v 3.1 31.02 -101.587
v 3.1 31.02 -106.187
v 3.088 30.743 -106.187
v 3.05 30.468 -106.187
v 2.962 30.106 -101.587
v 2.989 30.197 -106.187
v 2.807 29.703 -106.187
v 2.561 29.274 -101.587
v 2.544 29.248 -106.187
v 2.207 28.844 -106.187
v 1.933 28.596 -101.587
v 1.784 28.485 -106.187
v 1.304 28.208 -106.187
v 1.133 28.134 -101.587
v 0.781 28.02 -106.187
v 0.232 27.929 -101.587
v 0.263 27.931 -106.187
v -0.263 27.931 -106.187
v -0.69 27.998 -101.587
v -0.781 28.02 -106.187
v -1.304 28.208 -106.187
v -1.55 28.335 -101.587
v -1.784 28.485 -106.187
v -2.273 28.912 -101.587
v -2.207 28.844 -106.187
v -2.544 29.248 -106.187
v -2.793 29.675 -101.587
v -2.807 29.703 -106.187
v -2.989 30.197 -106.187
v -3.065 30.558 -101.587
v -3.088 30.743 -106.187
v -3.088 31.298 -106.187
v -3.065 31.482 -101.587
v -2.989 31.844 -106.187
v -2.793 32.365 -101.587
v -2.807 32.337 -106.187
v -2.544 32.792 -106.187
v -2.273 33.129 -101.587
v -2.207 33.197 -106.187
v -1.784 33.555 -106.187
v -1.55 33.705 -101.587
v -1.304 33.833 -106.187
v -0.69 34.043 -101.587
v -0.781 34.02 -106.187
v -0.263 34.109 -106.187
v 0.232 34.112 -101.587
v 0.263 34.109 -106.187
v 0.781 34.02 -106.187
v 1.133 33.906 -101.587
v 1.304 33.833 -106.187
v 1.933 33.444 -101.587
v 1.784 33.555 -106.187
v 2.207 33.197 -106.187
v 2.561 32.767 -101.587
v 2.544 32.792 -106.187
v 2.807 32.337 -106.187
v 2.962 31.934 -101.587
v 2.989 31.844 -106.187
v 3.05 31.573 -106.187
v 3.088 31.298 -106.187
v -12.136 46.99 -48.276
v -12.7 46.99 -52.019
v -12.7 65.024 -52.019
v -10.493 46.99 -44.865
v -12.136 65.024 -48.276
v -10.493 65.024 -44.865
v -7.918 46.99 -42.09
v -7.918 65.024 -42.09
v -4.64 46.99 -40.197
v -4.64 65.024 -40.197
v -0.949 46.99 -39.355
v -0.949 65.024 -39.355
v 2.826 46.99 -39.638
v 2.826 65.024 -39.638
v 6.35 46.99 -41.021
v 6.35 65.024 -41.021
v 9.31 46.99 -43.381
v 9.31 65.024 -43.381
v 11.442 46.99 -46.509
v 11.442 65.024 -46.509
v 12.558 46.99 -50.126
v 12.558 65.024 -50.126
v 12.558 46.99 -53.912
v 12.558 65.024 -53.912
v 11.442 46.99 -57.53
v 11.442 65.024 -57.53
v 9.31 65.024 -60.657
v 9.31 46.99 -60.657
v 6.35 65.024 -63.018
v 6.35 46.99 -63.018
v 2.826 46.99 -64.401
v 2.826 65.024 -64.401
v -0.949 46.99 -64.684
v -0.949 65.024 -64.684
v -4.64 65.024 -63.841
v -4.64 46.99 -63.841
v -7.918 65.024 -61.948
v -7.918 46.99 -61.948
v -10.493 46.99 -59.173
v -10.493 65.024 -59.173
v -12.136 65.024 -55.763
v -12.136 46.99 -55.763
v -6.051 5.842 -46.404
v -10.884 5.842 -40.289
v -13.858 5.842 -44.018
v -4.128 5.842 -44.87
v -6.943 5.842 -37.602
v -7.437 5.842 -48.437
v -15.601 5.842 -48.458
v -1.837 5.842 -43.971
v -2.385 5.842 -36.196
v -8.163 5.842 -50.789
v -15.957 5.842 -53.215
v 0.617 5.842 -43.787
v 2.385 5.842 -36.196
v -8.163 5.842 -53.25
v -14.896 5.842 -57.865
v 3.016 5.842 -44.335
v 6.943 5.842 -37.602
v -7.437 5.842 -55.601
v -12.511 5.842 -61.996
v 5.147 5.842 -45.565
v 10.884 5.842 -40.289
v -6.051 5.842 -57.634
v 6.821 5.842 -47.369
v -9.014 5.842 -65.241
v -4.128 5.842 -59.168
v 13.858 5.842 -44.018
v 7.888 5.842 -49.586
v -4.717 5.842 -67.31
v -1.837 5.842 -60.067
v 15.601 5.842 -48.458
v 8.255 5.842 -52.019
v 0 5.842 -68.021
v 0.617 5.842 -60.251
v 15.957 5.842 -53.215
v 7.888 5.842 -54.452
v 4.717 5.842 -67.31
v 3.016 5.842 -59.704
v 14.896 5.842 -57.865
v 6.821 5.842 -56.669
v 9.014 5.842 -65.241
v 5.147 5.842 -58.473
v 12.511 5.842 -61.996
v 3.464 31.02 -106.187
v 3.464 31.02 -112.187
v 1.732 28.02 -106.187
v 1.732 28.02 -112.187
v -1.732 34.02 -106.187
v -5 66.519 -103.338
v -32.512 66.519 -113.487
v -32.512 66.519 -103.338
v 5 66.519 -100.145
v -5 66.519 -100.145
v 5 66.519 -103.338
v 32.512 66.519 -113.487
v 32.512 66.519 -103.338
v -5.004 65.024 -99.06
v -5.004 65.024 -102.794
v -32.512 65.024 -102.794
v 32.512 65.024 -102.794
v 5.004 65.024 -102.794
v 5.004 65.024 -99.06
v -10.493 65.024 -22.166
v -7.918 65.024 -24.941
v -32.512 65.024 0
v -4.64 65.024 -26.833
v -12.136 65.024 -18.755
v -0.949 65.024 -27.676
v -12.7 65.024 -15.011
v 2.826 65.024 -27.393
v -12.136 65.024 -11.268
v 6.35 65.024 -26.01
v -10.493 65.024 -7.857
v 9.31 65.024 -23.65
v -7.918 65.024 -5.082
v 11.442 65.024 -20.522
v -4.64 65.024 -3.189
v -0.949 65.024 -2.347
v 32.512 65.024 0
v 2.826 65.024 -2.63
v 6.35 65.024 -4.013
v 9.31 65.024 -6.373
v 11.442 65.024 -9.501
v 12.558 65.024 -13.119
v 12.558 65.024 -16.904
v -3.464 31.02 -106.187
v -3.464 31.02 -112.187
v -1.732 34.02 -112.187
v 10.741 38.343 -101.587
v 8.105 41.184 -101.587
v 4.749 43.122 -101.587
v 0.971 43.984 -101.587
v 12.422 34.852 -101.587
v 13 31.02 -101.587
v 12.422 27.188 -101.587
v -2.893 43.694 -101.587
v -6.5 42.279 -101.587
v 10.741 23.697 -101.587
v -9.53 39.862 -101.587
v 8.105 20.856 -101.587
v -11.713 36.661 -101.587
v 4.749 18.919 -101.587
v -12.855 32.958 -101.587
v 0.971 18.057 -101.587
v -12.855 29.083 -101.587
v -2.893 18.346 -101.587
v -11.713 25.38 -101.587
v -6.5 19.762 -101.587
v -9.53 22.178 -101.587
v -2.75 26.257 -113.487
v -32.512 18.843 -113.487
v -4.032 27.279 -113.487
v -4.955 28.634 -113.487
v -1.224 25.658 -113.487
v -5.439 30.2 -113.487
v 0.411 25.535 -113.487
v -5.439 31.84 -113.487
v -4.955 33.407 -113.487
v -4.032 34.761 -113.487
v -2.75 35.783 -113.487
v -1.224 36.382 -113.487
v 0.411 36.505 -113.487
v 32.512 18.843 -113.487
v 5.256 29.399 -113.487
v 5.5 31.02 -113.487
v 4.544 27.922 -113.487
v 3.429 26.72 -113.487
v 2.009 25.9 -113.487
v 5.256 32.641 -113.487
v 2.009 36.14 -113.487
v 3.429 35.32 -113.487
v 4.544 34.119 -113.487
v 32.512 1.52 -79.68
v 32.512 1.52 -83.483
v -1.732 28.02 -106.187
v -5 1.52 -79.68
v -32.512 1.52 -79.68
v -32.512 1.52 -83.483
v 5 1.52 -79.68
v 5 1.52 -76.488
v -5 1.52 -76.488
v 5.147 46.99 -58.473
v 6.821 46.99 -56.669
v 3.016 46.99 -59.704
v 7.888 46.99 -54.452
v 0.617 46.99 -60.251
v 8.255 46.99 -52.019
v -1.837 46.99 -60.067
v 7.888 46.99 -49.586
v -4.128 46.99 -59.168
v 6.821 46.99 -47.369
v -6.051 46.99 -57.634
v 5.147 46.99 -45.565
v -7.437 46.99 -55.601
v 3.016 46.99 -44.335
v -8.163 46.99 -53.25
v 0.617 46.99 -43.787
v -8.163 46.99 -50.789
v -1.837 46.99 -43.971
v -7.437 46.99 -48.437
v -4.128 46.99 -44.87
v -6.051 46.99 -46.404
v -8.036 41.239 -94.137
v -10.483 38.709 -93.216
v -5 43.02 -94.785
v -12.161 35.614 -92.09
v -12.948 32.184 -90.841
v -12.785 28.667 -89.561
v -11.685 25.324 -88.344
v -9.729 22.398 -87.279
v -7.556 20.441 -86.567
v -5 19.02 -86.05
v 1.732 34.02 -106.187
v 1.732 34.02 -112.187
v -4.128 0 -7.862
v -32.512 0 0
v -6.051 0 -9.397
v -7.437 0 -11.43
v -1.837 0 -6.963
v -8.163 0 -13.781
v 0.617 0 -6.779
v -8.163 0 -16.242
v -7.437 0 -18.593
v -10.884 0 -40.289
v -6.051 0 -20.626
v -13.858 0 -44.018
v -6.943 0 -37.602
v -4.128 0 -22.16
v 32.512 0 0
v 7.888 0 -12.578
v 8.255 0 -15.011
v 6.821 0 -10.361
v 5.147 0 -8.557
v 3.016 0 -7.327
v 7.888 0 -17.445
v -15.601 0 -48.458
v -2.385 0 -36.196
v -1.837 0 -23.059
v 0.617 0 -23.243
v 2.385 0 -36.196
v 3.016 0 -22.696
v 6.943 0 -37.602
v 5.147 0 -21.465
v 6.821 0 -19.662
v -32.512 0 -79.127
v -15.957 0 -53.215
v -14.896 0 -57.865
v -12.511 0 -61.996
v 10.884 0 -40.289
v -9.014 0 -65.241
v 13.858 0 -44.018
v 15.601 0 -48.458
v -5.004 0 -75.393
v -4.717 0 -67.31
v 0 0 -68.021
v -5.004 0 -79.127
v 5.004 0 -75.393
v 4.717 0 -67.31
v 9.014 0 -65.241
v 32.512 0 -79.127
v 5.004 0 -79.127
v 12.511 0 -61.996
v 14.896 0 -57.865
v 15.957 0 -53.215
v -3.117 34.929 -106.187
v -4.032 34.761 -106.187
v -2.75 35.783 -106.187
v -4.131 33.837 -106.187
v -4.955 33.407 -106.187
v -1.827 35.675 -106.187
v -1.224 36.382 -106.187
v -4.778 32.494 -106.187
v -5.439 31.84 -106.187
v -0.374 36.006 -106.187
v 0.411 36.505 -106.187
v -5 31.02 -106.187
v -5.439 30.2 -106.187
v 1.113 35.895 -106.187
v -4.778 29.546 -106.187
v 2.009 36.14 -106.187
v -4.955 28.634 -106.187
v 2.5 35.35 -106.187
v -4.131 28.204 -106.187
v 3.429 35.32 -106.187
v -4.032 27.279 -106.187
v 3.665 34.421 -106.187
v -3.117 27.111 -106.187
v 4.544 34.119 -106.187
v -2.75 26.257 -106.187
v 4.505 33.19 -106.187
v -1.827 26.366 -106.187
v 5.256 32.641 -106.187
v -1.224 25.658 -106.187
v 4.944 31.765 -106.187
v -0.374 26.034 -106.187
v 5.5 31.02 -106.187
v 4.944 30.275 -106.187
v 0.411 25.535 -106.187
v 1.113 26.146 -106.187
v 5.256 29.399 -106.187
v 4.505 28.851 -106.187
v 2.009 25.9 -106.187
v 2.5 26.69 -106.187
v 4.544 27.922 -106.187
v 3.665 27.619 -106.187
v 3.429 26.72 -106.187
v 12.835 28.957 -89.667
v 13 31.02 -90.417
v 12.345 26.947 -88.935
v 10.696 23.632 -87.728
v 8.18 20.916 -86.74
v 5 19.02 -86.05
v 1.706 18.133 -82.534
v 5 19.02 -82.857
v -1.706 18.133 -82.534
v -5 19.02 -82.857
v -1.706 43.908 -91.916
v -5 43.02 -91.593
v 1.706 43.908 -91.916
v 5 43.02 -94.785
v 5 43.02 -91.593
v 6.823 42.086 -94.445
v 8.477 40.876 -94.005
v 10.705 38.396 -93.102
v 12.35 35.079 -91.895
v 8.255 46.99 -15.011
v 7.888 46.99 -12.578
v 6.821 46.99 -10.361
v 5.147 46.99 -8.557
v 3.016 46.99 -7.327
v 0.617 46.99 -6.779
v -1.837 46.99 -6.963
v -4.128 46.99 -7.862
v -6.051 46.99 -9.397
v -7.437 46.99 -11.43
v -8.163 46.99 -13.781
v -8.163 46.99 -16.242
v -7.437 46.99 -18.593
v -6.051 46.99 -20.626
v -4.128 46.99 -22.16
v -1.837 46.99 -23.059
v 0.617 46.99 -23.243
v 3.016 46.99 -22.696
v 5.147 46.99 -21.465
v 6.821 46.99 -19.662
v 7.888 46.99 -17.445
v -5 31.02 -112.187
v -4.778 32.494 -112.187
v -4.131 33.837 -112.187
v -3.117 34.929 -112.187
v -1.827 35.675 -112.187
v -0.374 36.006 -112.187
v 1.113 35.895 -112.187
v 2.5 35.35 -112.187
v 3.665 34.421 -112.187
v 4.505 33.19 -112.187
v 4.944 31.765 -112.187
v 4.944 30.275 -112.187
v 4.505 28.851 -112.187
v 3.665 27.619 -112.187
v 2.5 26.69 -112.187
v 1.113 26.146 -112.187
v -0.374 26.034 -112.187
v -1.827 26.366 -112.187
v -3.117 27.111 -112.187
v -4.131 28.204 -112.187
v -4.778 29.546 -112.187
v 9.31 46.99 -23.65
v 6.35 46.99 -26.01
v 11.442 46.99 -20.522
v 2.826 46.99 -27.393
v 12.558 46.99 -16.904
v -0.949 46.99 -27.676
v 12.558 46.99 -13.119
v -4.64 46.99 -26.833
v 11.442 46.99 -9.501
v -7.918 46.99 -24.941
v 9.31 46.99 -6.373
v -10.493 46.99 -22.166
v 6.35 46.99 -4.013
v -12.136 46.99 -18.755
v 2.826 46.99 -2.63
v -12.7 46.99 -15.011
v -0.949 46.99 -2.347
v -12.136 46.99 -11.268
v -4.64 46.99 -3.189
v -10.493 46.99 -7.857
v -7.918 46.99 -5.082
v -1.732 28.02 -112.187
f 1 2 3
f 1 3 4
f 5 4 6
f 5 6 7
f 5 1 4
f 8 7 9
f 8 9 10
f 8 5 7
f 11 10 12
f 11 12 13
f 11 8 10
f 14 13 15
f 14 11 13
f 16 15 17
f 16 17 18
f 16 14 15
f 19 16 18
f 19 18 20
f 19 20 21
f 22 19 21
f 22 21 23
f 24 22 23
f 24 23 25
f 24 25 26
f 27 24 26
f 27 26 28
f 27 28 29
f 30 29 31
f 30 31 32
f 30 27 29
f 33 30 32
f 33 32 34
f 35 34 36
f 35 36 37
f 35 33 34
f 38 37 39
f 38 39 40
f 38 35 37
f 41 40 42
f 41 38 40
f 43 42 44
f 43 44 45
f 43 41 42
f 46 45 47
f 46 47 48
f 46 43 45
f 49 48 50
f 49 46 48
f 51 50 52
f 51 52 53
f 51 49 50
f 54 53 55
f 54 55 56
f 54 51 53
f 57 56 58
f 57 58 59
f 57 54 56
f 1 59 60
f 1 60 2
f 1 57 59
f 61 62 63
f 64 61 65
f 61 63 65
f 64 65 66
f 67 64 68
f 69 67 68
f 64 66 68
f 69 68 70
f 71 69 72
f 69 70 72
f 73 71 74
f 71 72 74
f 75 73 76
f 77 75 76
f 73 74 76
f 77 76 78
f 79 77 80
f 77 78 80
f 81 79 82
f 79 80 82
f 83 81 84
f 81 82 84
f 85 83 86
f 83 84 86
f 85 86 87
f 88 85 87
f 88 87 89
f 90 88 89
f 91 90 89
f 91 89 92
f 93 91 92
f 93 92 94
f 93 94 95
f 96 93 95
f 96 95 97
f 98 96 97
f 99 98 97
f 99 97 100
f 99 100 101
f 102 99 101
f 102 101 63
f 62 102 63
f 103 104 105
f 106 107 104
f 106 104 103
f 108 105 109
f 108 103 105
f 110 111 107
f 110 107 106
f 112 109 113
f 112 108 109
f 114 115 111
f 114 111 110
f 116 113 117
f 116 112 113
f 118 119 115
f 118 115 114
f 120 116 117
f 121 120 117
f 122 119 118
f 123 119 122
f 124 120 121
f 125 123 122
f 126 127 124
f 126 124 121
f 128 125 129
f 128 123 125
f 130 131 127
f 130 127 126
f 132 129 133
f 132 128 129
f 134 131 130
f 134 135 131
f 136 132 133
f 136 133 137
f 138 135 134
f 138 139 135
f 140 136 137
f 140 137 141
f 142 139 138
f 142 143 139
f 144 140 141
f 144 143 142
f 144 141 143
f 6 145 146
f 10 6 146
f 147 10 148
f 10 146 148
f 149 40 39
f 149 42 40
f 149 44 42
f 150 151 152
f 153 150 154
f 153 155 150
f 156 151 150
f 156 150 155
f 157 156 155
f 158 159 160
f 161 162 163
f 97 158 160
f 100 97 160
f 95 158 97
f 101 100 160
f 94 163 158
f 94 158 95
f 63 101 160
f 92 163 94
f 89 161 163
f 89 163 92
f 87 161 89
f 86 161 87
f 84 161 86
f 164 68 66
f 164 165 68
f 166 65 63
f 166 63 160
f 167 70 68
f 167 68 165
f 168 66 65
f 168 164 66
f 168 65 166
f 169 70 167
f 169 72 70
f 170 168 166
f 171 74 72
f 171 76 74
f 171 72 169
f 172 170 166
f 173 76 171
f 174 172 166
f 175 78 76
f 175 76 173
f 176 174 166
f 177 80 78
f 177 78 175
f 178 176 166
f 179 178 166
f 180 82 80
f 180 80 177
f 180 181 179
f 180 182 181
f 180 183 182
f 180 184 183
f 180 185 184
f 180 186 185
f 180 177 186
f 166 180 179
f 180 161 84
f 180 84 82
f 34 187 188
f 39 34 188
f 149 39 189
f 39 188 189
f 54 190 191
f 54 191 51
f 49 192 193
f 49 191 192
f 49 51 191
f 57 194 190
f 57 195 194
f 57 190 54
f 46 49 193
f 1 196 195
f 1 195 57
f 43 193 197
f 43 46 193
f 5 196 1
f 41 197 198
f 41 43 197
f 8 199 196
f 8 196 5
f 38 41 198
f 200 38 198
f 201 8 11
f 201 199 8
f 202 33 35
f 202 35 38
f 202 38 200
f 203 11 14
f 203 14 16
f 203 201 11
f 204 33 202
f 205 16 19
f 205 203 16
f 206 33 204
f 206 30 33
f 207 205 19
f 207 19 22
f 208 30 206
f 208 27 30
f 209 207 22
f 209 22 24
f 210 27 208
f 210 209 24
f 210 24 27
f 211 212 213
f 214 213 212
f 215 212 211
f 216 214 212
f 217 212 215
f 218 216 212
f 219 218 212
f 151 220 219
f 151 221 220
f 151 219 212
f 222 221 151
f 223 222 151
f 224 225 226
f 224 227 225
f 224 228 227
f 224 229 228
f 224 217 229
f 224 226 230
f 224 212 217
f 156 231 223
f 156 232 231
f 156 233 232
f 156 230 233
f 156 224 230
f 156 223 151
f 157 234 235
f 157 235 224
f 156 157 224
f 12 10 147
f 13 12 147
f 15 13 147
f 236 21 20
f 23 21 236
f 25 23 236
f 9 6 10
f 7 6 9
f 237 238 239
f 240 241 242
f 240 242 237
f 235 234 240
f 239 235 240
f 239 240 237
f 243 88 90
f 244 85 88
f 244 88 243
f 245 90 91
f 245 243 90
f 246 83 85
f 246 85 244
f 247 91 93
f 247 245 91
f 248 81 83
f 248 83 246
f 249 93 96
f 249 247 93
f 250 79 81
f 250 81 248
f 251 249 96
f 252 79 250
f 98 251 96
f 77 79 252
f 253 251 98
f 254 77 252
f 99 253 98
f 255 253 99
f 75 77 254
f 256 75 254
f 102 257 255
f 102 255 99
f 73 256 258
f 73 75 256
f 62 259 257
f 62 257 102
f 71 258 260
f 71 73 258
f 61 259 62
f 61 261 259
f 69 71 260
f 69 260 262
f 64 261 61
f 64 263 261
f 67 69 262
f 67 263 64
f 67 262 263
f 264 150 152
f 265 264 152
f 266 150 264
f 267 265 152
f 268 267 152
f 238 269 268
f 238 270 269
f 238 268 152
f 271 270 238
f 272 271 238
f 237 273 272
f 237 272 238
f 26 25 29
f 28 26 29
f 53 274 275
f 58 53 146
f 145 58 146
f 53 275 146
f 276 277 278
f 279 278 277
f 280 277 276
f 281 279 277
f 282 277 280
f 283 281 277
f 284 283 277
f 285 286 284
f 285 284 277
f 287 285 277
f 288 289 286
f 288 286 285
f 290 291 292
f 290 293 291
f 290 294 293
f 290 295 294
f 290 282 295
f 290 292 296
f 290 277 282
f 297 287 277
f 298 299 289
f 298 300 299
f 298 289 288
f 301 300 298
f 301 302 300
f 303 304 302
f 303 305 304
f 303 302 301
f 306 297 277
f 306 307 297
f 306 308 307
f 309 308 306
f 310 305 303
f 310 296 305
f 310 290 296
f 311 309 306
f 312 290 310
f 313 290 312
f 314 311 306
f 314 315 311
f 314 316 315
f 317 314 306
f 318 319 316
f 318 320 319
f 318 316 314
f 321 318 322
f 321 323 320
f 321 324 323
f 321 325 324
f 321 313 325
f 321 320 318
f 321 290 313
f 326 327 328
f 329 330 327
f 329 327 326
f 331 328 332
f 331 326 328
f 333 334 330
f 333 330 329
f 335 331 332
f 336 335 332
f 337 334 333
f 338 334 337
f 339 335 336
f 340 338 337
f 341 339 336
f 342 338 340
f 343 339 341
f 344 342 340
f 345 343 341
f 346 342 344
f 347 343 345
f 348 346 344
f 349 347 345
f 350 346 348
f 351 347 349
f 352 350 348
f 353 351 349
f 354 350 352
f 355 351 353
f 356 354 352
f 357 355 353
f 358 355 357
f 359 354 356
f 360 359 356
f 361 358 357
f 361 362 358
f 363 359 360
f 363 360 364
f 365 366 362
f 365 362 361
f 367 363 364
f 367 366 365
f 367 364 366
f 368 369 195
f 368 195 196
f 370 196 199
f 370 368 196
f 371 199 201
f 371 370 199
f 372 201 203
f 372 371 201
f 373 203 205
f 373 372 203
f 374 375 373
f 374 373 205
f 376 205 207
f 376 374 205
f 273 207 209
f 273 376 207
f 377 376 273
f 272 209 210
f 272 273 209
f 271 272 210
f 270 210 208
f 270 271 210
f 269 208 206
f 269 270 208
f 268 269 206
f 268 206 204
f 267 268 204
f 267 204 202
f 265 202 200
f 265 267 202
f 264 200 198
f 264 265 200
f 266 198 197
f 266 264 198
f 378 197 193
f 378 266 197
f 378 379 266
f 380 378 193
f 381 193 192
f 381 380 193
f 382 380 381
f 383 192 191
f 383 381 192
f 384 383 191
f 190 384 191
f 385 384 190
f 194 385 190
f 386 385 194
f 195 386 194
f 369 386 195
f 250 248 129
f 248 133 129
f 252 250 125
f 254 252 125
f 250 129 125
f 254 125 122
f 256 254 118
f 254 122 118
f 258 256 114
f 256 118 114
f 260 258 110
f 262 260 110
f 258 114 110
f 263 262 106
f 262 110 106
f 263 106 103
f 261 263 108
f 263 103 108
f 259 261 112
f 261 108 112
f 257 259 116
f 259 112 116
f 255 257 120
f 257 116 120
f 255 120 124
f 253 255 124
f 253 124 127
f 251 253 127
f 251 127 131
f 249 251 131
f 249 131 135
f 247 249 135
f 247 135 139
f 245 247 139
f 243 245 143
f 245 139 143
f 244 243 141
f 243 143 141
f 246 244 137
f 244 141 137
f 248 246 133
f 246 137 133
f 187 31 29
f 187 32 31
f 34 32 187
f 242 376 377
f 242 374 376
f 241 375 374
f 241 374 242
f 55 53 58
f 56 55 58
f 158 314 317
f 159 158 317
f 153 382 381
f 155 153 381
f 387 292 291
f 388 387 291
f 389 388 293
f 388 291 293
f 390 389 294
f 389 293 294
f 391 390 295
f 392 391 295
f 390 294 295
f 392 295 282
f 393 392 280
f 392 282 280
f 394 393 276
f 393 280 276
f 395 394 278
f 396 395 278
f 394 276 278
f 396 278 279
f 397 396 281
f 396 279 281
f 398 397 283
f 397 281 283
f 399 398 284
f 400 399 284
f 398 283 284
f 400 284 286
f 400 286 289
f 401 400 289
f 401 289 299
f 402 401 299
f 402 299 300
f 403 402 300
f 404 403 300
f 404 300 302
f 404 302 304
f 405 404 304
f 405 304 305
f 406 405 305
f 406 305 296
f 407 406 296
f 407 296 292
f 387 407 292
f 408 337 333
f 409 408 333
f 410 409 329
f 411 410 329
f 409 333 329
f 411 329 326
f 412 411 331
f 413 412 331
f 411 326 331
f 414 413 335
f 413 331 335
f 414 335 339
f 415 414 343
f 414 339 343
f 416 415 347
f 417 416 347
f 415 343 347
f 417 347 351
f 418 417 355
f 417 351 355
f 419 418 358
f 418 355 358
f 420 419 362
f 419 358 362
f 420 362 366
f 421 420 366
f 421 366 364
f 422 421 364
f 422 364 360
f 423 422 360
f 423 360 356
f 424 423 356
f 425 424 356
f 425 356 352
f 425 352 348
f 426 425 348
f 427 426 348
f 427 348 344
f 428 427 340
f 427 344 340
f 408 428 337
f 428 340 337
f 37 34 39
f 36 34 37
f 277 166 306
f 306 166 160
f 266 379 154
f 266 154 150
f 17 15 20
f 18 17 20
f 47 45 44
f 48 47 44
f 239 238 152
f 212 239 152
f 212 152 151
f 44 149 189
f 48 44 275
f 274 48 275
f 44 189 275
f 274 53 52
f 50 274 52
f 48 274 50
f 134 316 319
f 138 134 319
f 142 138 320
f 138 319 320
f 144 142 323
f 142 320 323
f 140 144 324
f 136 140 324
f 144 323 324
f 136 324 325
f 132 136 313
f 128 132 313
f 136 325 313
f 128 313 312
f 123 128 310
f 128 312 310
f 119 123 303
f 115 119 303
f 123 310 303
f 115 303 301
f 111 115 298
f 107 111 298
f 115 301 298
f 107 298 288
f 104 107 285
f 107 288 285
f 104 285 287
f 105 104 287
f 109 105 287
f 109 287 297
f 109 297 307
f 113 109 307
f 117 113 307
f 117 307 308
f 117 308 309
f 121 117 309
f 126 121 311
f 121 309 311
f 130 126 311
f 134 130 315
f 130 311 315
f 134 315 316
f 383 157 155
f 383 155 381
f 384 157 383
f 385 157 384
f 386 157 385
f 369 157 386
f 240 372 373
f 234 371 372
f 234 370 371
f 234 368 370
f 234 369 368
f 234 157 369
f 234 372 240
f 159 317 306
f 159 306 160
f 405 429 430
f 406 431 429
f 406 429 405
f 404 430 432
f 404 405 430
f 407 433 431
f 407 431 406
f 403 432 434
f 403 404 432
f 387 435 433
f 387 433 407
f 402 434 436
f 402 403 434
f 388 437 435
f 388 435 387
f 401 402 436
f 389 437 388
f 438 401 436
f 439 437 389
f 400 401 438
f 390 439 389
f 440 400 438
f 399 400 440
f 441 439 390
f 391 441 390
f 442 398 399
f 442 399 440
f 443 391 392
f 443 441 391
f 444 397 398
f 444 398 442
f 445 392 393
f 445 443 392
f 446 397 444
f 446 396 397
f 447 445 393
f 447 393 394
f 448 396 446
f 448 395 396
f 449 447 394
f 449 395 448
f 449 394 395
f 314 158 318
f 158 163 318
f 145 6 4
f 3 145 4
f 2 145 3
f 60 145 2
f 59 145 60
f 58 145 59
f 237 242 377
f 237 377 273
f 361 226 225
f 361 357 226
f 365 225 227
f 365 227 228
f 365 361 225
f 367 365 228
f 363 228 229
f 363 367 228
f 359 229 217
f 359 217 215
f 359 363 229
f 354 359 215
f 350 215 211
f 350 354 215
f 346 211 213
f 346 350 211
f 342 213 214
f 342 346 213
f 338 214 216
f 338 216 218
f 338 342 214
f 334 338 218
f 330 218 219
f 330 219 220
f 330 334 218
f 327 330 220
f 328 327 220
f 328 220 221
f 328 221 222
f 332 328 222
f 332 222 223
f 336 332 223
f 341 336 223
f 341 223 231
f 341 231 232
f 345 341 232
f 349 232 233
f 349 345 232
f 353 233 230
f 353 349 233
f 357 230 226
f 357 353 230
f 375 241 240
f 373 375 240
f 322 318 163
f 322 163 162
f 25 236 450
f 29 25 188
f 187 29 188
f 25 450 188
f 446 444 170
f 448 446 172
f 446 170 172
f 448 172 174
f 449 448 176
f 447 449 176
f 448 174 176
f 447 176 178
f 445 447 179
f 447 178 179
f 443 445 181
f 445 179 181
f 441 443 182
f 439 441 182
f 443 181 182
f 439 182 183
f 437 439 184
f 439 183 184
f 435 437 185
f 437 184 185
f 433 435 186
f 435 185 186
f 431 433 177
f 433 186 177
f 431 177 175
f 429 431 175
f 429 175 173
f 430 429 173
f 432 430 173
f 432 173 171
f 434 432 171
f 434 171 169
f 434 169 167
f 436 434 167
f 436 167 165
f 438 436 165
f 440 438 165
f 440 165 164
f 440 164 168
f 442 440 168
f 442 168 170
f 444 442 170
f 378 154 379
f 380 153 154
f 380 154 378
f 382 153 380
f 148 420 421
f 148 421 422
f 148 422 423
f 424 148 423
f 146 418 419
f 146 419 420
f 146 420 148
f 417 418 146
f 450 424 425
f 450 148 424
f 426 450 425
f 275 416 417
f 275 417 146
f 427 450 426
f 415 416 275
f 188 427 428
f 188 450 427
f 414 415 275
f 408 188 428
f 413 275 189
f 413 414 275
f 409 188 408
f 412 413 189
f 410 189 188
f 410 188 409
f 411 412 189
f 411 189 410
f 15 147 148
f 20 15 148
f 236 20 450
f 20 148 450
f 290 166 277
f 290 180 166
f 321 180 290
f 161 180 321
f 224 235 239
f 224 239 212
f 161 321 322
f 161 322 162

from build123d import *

# Parameters (mm, degrees)
EXTRUDE1_DEPTH     = 32.512
CUT_EXTRUDE1_DEPTH = 5.0038
HOLE1_D            = 16.51
HOLE1_DEPTH        = 65.024
HOLE1_CBORE_D      = 25.4
HOLE1_CBORE_DEPTH  = 18.034
EXTRUDE2_DEPTH     = 32.512
EXTRUDE3_DEPTH     = 4.99999
SKETCH10_R         = 5
EXTRUDE4_DEPTH     = 6
CUT_EXTRUDE2_DEPTH = 6
SKETCH12_R         = 16.002
CUT_EXTRUDE3_DEPTH = 5.842


with BuildPart() as part:
    # Sketch1 → Extrude1 (new body, symmetric)
    with BuildSketch(Plane(origin=(0, 0, 0), x_dir=(0, 0, -1), z_dir=(1, 0, 0))):
        Polygon((0, 65.024), (0, 0), (79.126999487, 0), (102.7938, 65.024), align=None)
    extrude(amount=EXTRUDE1_DEPTH, both=True)

    # Sketch2 → Cut-Extrude1 (cut, symmetric)
    with BuildSketch(Plane(origin=(0, 0, 0), x_dir=(0, 0, -1), z_dir=(1, 0, 0))):
        Polygon((99.06, 65.024), (75.393199487, 0), (79.126999487, 0), (102.7938, 65.024), align=None)
    extrude(amount=CUT_EXTRUDE1_DEPTH, both=True, mode=Mode.SUBTRACT)

    # Hole1
    with Locations(Plane(origin=(0, 65.024, 0), x_dir=(-1, 0, 0), z_dir=(0, 1, 0))):
        with Locations((0, -15.0114), (0, -52.0192)):
            CounterBoreHole(HOLE1_D / 2, HOLE1_CBORE_D / 2, HOLE1_CBORE_DEPTH, depth=HOLE1_DEPTH)

    # Sketch12 → Cut-Extrude3 (cut)
    with BuildSketch(Plane.XZ):
        with Locations(Location((0, -52.0192, 0), (0, 0, 270))):  # turned: the seam where the file's is
            Circle(SKETCH12_R)
    extrude(amount=-CUT_EXTRUDE3_DEPTH, mode=Mode.SUBTRACT)


with BuildPart() as body_2:
    # Sketch7 → Extrude2 (new body, symmetric)
    with BuildSketch(Plane(origin=(0, 0, 0), x_dir=(0, 0, -1), z_dir=(1, 0, 0))):
        Polygon((79.680312331, 1.520214545), (83.483230271, 1.520214545), (113.4872, 18.843014545), (113.4872, 66.518814545), (103.337868, 66.518814545), align=None)
    extrude(amount=EXTRUDE2_DEPTH, both=True)

    # Sketch8 → Extrude3 (add, symmetric)
    with BuildSketch(Plane(origin=(0, 0, 0), x_dir=(0, 0, -1), z_dir=(1, 0, 0))):
        Polygon((103.337868, 66.518814545), (100.145334683, 66.518814545), (76.487779014, 1.520214545), (79.680312331, 1.520214545), align=None)
    extrude(amount=EXTRUDE3_DEPTH, both=True)

    # Sketch9 → Cut-Revolve1 (revolve, cut)
    with BuildSketch(Plane(origin=(0, 0, 0), x_dir=(0, 0, -1), z_dir=(1, 0, 0)), mode=Mode.PRIVATE) as cut_revolve1_sk:
        Polygon((76.1873, 31.020214545), (113.4872, 31.020214545), (113.4872, 36.520330545), (106.18724, 36.520330545), (106.18724, 34.120284545), (101.5873, 34.120284545), (101.5873, 44.020214545), (76.1873, 44.020214545), align=None)
    revolve(cut_revolve1_sk.sketch.rotate(Axis((0, 31.020214545, -47.431210166), (0, 0, -1)), 90), axis=Axis((0, 31.020214545, -47.431210166), (0, 0, -1)), mode=Mode.SUBTRACT)  # turned: the seam where the file's is

    # Sketch10 → Extrude4 (add)
    with BuildSketch(Plane(origin=(0, 0, -106.18724), x_dir=(-1, 0, 0), z_dir=(0, 0, -1))):
        with Locations((0, 31.020214545)):
            Circle(SKETCH10_R)
    extrude(amount=EXTRUDE4_DEPTH)

    # Sketch11 → Cut-Extrude2 (cut)
    with BuildSketch(Plane(origin=(0, 0, -112.18724), x_dir=(-1, 0, 0), z_dir=(0, 0, -1))):
        Polygon((1.732050808, 28.020214545), (3.464101615, 31.020214545), (1.732050808, 34.020214545), (-1.732050808, 34.020214545), (-3.464101615, 31.020214545), (-1.732050808, 28.020214545), align=None)
    extrude(amount=-CUT_EXTRUDE2_DEPTH, mode=Mode.SUBTRACT)


solid = Compound([part.part, body_2.part])
